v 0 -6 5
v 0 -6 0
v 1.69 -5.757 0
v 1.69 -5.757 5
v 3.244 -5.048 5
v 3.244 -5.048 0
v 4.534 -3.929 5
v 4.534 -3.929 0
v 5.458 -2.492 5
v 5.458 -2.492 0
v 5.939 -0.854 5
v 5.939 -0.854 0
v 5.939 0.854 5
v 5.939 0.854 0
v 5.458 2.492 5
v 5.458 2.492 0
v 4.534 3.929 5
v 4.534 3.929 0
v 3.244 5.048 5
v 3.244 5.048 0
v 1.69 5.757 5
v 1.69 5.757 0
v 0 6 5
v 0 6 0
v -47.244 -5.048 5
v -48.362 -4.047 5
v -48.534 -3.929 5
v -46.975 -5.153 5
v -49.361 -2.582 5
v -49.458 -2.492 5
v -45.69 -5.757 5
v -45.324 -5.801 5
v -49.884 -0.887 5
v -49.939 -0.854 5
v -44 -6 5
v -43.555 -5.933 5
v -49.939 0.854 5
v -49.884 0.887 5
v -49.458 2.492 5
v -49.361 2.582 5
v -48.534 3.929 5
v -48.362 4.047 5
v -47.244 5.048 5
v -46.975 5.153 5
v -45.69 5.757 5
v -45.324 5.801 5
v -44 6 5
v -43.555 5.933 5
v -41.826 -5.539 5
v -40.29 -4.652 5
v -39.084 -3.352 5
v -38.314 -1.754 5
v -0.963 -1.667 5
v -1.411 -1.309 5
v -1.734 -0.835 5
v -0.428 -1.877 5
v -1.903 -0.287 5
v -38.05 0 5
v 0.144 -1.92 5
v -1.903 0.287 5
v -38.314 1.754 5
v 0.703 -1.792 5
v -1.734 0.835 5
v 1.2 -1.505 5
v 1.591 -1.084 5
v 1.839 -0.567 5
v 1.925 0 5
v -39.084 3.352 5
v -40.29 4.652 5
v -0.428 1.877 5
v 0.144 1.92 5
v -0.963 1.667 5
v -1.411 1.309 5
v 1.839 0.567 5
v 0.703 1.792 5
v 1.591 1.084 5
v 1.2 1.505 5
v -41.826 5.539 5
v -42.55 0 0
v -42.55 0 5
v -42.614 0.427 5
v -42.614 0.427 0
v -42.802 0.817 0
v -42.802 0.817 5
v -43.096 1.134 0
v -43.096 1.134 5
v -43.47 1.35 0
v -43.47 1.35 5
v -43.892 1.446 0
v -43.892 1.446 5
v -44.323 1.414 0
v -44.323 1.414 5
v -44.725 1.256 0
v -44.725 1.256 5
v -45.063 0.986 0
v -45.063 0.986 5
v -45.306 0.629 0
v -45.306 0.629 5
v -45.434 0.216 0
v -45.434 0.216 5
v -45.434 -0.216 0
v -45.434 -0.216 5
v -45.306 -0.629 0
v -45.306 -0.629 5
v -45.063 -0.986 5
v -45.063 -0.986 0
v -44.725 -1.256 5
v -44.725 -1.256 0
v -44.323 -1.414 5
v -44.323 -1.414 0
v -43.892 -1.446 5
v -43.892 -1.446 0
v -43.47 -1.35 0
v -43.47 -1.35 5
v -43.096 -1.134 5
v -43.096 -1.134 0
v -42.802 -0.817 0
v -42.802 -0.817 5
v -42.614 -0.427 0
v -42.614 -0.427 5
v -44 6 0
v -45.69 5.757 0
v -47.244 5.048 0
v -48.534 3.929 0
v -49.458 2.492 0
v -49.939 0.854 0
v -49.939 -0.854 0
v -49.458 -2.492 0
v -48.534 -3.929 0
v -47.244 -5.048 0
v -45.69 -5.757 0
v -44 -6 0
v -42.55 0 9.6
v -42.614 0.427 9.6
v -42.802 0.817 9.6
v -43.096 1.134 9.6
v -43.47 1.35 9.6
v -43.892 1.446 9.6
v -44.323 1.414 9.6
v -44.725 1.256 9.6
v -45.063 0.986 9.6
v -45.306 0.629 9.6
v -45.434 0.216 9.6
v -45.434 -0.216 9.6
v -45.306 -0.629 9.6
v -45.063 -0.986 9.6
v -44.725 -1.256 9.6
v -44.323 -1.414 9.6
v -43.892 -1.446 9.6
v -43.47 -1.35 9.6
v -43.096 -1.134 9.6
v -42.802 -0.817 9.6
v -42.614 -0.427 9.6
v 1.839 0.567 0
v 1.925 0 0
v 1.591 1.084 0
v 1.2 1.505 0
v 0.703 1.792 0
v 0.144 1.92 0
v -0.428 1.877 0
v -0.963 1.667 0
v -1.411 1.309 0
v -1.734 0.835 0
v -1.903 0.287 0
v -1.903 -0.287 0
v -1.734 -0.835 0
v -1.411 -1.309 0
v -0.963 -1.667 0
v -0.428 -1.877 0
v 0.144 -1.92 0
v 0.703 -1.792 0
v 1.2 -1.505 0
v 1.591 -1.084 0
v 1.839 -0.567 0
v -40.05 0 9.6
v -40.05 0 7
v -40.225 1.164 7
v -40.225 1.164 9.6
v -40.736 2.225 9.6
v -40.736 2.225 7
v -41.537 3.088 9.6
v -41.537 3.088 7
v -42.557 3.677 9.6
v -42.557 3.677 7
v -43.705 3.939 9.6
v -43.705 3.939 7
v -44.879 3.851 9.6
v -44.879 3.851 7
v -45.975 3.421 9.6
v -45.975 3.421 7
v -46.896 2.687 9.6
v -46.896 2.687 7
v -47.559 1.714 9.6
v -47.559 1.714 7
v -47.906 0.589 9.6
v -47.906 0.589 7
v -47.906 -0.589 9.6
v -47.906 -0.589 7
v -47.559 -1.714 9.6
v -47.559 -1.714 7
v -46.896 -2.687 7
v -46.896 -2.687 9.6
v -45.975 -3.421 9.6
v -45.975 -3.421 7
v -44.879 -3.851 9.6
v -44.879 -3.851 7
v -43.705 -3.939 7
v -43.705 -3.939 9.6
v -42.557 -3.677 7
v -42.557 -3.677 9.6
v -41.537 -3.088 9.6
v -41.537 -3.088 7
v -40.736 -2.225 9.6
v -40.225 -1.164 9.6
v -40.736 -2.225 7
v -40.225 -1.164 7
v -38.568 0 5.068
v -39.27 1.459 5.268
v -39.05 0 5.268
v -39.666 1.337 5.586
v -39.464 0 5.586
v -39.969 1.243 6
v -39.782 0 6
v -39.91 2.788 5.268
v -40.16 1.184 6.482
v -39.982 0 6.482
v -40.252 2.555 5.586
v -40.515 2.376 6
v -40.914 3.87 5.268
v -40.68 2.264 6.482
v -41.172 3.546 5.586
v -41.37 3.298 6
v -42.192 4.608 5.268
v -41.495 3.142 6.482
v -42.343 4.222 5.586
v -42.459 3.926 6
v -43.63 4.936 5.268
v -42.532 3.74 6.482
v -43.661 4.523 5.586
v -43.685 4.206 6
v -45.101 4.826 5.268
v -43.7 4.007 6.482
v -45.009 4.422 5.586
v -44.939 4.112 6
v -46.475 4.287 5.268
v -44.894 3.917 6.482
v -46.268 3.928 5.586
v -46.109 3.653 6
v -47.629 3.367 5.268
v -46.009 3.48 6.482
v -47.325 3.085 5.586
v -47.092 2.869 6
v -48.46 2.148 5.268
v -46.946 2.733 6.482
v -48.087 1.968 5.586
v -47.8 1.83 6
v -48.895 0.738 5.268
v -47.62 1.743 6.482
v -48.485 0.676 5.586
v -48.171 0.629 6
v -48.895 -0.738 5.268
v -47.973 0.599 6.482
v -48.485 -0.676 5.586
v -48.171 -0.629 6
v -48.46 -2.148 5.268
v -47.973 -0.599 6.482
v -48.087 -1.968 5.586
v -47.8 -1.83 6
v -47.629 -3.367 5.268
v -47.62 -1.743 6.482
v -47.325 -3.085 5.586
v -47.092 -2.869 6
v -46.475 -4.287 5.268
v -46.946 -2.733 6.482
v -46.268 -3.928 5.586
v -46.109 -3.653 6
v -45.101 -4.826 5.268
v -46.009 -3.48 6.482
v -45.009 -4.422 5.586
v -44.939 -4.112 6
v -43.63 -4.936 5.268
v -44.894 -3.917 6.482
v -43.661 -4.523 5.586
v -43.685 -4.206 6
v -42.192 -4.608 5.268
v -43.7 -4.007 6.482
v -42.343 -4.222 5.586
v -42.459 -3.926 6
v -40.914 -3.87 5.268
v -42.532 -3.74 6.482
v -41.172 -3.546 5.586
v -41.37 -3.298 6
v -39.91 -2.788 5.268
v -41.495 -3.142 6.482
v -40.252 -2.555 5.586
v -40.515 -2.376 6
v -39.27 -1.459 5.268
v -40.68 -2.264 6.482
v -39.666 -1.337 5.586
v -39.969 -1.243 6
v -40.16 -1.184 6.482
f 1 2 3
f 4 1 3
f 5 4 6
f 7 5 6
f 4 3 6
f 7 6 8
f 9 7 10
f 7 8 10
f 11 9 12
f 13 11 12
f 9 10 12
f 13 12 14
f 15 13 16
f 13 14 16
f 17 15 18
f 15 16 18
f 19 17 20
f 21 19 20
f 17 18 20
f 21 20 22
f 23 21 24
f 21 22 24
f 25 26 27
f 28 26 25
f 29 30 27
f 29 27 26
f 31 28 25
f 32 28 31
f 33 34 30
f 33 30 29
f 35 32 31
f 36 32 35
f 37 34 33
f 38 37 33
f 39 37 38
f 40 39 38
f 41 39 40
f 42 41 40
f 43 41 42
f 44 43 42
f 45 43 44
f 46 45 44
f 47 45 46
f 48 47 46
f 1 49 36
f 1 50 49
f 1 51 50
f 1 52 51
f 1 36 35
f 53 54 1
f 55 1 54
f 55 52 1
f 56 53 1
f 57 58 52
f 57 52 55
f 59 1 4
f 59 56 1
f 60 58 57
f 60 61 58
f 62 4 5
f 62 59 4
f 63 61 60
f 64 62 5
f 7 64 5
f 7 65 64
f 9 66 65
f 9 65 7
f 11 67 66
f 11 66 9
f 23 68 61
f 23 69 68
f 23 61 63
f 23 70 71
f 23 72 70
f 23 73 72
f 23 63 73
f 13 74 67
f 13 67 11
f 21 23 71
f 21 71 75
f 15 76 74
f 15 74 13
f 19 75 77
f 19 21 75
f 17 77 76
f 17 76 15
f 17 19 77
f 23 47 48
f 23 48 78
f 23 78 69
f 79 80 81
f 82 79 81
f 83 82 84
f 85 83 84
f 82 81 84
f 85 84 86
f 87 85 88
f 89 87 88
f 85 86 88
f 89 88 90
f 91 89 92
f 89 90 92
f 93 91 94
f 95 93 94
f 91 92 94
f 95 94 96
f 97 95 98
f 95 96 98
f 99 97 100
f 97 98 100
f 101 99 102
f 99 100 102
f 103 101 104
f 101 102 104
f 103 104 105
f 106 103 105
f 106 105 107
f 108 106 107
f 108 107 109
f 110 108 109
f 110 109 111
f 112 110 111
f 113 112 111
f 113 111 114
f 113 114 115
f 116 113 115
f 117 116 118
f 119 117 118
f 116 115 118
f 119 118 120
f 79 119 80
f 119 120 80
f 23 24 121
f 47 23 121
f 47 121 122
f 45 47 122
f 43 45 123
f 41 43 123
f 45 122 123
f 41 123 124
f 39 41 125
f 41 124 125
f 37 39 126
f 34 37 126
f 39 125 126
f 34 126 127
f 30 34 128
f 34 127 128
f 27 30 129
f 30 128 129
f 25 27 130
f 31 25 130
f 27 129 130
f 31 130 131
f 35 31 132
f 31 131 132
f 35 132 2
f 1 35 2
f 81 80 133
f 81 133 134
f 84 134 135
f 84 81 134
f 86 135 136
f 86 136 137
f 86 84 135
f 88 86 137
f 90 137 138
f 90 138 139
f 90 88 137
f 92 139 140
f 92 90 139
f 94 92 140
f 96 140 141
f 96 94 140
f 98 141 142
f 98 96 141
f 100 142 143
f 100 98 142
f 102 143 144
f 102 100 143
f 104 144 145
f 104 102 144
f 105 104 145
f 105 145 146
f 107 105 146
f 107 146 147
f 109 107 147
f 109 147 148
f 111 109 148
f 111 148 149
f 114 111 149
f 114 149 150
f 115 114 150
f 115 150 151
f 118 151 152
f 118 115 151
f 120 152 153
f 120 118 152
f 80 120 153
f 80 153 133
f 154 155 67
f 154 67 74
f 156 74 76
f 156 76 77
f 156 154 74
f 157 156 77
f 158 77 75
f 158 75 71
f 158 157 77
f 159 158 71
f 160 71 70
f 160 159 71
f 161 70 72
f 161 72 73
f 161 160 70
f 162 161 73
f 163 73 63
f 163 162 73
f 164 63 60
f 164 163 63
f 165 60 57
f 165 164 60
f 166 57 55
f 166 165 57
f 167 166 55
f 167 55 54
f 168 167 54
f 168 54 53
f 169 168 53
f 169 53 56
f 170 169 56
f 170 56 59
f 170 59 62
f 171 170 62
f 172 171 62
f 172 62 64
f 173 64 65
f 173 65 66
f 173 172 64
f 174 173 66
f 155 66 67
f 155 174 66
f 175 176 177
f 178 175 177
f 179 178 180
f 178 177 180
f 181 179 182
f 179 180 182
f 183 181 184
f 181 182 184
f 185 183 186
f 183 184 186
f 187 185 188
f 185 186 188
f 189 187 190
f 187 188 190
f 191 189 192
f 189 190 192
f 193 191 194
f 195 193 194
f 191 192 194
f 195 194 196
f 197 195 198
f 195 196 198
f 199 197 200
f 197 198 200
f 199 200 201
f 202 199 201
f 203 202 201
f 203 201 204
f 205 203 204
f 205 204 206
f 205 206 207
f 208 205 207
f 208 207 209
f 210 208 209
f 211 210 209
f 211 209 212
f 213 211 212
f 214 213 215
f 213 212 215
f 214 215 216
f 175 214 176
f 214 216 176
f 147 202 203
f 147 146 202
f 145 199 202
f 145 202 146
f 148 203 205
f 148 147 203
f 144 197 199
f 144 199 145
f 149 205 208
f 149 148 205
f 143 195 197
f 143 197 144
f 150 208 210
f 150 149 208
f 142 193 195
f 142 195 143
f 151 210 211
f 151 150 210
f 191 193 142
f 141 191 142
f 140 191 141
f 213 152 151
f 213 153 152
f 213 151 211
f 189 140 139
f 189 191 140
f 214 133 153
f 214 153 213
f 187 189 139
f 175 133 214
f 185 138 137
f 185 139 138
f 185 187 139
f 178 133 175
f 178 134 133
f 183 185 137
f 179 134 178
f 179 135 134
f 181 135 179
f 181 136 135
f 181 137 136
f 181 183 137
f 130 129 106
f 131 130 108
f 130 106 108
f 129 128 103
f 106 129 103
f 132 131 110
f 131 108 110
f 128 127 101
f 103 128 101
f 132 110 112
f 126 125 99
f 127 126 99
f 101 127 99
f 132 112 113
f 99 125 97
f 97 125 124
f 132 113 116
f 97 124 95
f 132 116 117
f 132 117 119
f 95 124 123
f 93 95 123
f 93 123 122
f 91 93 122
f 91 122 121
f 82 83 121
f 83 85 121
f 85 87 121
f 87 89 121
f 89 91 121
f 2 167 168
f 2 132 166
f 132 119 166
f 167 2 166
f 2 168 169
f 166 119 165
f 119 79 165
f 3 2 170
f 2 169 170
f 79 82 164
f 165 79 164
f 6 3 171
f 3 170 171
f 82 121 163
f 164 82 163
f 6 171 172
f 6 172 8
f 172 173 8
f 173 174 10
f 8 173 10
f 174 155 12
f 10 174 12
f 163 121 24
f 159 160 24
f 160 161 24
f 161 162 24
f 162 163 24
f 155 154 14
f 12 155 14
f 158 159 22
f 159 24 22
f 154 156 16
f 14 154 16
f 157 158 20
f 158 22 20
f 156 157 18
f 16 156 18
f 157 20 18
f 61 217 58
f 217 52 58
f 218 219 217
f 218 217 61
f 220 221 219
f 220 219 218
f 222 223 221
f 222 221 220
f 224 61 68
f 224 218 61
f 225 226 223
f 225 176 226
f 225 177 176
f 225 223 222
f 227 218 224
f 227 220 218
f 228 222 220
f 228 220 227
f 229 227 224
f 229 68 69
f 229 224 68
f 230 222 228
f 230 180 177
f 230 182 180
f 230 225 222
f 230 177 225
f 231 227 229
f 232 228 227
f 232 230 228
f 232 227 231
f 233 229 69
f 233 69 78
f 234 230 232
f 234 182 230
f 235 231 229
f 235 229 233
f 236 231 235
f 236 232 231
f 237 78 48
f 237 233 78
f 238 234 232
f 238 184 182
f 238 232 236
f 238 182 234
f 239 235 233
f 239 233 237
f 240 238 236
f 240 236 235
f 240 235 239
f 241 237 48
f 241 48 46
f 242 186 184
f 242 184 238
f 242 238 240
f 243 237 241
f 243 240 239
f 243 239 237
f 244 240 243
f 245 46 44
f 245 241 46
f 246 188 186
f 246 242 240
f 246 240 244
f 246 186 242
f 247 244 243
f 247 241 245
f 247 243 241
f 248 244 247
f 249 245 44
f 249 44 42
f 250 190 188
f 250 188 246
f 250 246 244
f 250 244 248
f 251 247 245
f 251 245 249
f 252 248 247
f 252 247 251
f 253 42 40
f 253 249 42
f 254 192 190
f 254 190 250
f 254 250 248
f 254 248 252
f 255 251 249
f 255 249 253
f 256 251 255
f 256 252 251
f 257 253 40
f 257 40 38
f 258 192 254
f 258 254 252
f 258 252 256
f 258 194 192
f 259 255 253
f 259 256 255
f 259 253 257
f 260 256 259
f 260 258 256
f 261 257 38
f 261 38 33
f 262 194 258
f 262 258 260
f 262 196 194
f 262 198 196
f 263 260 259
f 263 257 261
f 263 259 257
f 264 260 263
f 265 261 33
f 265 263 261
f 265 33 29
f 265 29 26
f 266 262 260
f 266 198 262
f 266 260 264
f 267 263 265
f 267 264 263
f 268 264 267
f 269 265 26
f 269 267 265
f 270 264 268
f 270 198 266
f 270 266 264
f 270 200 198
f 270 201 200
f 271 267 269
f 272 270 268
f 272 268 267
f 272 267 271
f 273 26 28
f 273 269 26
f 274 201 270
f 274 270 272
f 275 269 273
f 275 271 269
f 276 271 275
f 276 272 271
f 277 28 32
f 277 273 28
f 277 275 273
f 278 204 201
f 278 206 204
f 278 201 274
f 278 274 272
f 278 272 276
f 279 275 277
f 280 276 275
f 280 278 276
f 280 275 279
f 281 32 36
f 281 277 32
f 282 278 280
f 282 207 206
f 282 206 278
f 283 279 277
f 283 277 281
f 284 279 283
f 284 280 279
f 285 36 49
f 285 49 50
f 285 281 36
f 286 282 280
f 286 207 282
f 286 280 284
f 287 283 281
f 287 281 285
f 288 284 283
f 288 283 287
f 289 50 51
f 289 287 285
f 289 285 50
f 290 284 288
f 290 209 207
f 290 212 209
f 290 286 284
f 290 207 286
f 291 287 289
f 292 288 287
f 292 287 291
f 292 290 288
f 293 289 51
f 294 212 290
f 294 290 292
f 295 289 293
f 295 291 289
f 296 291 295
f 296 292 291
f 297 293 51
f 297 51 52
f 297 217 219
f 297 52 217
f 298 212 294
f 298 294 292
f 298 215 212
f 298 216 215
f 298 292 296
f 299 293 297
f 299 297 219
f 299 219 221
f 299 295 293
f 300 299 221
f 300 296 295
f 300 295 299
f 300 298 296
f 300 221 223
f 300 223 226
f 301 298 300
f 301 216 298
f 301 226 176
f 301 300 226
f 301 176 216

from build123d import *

# Parameters (mm, degrees)
F0_R          = 1.925
F1_DEPTH      = 5
F2_R          = 3.95
F2_R_2        = 1.45
F3_DEPTH      = 4.6
F3_DEPTH_BACK = 5
F4_R          = 2


with BuildPart() as f1:
    # F0 (on Top) → F1 (new body)
    with BuildSketch(Plane.XY):
        with BuildLine():
            Line((-44, -6), (0, -6))
            ThreePointArc((0, -6), (6, 0), (0, 6))
            Line((0, 6), (-44, 6))
            ThreePointArc((-44, 6), (-50, 0), (-44, -6))
        make_face()
        with Locations((-44, 0)):
            Circle(F0_R, mode=Mode.SUBTRACT)
        Circle(F0_R, mode=Mode.SUBTRACT)
    extrude(amount=F1_DEPTH)

    # F2 (on face) → F3 (join, two sides)
    with BuildSketch(Plane.XY.offset(5)) as f3_sk:
        with Locations((-44, 0)):
            Circle(F2_R)
        with Locations((-44, 0)):
            Circle(F2_R_2, mode=Mode.SUBTRACT)
    extrude(amount=F3_DEPTH)
    extrude(f3_sk.sketch, amount=-F3_DEPTH_BACK)

    # F4
    f4_edges = [f1.edges().sort_by_distance(p)[0] for p in [
        (-47.95, 0, 5),
    ]]
    fillet(f4_edges, radius=F4_R)


solid = f1.part
